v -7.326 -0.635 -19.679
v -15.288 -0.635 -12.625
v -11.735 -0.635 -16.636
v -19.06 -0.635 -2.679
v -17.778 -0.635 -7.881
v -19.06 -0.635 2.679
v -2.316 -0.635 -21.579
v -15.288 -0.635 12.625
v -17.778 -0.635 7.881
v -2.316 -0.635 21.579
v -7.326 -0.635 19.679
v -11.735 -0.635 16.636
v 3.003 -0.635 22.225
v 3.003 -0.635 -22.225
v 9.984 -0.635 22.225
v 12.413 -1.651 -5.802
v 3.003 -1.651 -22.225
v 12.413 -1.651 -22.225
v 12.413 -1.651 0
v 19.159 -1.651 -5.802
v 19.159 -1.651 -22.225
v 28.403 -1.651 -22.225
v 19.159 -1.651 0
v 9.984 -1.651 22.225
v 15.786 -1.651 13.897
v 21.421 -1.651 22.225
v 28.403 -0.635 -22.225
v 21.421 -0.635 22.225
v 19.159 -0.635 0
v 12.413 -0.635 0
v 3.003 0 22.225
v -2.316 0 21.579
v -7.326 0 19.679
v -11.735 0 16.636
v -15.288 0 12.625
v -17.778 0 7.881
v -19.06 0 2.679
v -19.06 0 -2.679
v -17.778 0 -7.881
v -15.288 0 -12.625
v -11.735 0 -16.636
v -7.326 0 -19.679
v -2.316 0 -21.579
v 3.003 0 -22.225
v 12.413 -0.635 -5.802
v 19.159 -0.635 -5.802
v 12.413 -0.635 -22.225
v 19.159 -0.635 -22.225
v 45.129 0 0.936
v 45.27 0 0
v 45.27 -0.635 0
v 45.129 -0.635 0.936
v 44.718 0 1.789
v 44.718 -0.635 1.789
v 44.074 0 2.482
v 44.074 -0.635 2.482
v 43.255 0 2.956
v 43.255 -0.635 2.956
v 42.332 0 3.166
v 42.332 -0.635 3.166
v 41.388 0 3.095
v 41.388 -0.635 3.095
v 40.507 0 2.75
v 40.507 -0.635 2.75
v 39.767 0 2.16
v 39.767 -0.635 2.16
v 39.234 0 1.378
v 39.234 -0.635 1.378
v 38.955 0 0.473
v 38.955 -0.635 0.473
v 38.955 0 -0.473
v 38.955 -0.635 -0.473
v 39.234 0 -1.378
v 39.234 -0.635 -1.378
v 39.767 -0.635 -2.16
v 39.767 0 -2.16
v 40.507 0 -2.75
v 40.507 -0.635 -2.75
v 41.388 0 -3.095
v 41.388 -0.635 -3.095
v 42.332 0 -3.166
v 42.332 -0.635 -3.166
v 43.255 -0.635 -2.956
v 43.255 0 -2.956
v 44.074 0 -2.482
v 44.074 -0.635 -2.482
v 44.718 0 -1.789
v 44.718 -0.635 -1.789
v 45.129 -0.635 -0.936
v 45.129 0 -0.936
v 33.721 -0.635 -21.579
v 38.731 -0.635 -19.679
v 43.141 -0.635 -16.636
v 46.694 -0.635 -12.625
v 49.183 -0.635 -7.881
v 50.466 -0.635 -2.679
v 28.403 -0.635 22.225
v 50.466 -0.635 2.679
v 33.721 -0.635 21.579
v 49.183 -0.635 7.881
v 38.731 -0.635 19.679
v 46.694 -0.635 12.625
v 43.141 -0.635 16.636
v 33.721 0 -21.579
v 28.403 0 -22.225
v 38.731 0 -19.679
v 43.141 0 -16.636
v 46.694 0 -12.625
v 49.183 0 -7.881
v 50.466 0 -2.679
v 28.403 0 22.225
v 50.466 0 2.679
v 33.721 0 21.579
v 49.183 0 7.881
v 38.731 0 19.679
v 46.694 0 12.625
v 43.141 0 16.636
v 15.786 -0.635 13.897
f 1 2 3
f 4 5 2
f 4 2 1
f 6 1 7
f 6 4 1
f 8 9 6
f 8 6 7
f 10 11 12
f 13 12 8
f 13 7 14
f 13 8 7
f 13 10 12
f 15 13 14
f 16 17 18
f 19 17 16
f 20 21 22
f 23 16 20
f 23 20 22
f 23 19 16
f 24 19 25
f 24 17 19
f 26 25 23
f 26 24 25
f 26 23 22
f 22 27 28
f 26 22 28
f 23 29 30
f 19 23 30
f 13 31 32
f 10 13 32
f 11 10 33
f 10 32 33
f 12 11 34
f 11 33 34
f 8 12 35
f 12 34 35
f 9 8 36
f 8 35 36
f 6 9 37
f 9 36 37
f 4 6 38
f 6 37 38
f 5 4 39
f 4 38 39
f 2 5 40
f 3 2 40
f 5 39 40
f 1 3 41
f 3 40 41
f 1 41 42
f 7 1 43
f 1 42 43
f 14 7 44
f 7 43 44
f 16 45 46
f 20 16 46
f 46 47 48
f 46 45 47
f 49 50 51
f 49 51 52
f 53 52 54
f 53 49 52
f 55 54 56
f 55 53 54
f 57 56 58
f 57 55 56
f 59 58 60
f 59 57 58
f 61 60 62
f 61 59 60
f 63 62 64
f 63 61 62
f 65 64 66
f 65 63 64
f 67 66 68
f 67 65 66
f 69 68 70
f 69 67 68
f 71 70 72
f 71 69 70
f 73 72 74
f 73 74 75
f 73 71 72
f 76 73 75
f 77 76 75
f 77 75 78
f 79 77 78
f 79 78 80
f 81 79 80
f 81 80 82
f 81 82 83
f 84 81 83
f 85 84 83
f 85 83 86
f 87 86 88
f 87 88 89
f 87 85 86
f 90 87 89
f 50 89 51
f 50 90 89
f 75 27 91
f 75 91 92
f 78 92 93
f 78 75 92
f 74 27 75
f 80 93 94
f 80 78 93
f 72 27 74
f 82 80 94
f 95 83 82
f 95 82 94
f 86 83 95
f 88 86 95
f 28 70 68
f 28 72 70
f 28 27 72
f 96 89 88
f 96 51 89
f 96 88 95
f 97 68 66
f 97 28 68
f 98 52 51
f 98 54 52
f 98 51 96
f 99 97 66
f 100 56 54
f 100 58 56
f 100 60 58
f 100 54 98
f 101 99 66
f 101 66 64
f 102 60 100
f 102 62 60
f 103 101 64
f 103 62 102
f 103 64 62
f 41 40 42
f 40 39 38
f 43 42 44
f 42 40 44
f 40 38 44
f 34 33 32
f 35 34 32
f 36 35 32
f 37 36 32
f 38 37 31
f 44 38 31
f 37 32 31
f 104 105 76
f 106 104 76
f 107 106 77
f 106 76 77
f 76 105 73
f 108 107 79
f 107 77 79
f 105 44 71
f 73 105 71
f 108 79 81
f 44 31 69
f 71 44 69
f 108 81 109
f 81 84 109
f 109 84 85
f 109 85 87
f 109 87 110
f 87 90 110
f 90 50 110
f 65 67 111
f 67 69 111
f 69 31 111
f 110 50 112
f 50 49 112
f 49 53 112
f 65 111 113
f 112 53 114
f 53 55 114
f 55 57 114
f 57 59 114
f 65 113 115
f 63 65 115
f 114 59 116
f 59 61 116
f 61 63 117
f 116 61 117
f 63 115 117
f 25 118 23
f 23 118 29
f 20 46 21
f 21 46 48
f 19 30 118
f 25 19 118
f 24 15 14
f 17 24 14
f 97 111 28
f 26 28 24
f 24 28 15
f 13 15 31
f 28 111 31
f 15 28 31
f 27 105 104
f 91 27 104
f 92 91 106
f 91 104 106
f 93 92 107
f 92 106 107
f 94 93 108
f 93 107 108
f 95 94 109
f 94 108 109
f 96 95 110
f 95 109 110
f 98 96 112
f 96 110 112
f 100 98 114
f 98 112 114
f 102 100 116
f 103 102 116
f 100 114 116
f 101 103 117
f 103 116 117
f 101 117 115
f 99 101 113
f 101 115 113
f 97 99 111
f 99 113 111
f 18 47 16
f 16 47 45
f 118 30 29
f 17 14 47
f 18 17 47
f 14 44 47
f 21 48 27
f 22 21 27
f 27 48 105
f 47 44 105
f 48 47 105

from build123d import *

# Parameters (mm, degrees)
F0_R     = 3.175
F1_DEPTH = 0.635
F3_DEPTH = 1.016


with BuildPart() as f1:
    # F0 (on Front) → F1 (new body)
    with BuildSketch(Plane.XZ):
        with BuildLine():
            Line((28.402705, 22.225), (3.002705, 22.225))
            ThreePointArc((3.002705, 22.225), (-19.222295, 0), (3.002705, -22.225))
            Line((3.002705, -22.225), (28.402705, -22.225))
            ThreePointArc((28.402705, -22.225), (50.627705, 0), (28.402705, 22.225))
        make_face()
        with Locations((42.094897, 0)):
            Circle(F0_R, mode=Mode.SUBTRACT)
    extrude(amount=F1_DEPTH)

    # F2 (on face) → F3 (join)
    with BuildSketch(Plane.XZ.offset(0.635)):
        Polygon((9.984385, 22.225), (3.002705, -22.225), (12.413018, -22.225), (12.413018, -5.801737), (19.159222, -5.801737), (19.159222, -22.225), (28.402705, -22.225), (21.421025, 22.225), align=None)
        Polygon((19.159222, 0), (12.413018, 0), (15.78612, 13.897184), align=None, mode=Mode.SUBTRACT)
    extrude(amount=F3_DEPTH)


solid = f1.part
